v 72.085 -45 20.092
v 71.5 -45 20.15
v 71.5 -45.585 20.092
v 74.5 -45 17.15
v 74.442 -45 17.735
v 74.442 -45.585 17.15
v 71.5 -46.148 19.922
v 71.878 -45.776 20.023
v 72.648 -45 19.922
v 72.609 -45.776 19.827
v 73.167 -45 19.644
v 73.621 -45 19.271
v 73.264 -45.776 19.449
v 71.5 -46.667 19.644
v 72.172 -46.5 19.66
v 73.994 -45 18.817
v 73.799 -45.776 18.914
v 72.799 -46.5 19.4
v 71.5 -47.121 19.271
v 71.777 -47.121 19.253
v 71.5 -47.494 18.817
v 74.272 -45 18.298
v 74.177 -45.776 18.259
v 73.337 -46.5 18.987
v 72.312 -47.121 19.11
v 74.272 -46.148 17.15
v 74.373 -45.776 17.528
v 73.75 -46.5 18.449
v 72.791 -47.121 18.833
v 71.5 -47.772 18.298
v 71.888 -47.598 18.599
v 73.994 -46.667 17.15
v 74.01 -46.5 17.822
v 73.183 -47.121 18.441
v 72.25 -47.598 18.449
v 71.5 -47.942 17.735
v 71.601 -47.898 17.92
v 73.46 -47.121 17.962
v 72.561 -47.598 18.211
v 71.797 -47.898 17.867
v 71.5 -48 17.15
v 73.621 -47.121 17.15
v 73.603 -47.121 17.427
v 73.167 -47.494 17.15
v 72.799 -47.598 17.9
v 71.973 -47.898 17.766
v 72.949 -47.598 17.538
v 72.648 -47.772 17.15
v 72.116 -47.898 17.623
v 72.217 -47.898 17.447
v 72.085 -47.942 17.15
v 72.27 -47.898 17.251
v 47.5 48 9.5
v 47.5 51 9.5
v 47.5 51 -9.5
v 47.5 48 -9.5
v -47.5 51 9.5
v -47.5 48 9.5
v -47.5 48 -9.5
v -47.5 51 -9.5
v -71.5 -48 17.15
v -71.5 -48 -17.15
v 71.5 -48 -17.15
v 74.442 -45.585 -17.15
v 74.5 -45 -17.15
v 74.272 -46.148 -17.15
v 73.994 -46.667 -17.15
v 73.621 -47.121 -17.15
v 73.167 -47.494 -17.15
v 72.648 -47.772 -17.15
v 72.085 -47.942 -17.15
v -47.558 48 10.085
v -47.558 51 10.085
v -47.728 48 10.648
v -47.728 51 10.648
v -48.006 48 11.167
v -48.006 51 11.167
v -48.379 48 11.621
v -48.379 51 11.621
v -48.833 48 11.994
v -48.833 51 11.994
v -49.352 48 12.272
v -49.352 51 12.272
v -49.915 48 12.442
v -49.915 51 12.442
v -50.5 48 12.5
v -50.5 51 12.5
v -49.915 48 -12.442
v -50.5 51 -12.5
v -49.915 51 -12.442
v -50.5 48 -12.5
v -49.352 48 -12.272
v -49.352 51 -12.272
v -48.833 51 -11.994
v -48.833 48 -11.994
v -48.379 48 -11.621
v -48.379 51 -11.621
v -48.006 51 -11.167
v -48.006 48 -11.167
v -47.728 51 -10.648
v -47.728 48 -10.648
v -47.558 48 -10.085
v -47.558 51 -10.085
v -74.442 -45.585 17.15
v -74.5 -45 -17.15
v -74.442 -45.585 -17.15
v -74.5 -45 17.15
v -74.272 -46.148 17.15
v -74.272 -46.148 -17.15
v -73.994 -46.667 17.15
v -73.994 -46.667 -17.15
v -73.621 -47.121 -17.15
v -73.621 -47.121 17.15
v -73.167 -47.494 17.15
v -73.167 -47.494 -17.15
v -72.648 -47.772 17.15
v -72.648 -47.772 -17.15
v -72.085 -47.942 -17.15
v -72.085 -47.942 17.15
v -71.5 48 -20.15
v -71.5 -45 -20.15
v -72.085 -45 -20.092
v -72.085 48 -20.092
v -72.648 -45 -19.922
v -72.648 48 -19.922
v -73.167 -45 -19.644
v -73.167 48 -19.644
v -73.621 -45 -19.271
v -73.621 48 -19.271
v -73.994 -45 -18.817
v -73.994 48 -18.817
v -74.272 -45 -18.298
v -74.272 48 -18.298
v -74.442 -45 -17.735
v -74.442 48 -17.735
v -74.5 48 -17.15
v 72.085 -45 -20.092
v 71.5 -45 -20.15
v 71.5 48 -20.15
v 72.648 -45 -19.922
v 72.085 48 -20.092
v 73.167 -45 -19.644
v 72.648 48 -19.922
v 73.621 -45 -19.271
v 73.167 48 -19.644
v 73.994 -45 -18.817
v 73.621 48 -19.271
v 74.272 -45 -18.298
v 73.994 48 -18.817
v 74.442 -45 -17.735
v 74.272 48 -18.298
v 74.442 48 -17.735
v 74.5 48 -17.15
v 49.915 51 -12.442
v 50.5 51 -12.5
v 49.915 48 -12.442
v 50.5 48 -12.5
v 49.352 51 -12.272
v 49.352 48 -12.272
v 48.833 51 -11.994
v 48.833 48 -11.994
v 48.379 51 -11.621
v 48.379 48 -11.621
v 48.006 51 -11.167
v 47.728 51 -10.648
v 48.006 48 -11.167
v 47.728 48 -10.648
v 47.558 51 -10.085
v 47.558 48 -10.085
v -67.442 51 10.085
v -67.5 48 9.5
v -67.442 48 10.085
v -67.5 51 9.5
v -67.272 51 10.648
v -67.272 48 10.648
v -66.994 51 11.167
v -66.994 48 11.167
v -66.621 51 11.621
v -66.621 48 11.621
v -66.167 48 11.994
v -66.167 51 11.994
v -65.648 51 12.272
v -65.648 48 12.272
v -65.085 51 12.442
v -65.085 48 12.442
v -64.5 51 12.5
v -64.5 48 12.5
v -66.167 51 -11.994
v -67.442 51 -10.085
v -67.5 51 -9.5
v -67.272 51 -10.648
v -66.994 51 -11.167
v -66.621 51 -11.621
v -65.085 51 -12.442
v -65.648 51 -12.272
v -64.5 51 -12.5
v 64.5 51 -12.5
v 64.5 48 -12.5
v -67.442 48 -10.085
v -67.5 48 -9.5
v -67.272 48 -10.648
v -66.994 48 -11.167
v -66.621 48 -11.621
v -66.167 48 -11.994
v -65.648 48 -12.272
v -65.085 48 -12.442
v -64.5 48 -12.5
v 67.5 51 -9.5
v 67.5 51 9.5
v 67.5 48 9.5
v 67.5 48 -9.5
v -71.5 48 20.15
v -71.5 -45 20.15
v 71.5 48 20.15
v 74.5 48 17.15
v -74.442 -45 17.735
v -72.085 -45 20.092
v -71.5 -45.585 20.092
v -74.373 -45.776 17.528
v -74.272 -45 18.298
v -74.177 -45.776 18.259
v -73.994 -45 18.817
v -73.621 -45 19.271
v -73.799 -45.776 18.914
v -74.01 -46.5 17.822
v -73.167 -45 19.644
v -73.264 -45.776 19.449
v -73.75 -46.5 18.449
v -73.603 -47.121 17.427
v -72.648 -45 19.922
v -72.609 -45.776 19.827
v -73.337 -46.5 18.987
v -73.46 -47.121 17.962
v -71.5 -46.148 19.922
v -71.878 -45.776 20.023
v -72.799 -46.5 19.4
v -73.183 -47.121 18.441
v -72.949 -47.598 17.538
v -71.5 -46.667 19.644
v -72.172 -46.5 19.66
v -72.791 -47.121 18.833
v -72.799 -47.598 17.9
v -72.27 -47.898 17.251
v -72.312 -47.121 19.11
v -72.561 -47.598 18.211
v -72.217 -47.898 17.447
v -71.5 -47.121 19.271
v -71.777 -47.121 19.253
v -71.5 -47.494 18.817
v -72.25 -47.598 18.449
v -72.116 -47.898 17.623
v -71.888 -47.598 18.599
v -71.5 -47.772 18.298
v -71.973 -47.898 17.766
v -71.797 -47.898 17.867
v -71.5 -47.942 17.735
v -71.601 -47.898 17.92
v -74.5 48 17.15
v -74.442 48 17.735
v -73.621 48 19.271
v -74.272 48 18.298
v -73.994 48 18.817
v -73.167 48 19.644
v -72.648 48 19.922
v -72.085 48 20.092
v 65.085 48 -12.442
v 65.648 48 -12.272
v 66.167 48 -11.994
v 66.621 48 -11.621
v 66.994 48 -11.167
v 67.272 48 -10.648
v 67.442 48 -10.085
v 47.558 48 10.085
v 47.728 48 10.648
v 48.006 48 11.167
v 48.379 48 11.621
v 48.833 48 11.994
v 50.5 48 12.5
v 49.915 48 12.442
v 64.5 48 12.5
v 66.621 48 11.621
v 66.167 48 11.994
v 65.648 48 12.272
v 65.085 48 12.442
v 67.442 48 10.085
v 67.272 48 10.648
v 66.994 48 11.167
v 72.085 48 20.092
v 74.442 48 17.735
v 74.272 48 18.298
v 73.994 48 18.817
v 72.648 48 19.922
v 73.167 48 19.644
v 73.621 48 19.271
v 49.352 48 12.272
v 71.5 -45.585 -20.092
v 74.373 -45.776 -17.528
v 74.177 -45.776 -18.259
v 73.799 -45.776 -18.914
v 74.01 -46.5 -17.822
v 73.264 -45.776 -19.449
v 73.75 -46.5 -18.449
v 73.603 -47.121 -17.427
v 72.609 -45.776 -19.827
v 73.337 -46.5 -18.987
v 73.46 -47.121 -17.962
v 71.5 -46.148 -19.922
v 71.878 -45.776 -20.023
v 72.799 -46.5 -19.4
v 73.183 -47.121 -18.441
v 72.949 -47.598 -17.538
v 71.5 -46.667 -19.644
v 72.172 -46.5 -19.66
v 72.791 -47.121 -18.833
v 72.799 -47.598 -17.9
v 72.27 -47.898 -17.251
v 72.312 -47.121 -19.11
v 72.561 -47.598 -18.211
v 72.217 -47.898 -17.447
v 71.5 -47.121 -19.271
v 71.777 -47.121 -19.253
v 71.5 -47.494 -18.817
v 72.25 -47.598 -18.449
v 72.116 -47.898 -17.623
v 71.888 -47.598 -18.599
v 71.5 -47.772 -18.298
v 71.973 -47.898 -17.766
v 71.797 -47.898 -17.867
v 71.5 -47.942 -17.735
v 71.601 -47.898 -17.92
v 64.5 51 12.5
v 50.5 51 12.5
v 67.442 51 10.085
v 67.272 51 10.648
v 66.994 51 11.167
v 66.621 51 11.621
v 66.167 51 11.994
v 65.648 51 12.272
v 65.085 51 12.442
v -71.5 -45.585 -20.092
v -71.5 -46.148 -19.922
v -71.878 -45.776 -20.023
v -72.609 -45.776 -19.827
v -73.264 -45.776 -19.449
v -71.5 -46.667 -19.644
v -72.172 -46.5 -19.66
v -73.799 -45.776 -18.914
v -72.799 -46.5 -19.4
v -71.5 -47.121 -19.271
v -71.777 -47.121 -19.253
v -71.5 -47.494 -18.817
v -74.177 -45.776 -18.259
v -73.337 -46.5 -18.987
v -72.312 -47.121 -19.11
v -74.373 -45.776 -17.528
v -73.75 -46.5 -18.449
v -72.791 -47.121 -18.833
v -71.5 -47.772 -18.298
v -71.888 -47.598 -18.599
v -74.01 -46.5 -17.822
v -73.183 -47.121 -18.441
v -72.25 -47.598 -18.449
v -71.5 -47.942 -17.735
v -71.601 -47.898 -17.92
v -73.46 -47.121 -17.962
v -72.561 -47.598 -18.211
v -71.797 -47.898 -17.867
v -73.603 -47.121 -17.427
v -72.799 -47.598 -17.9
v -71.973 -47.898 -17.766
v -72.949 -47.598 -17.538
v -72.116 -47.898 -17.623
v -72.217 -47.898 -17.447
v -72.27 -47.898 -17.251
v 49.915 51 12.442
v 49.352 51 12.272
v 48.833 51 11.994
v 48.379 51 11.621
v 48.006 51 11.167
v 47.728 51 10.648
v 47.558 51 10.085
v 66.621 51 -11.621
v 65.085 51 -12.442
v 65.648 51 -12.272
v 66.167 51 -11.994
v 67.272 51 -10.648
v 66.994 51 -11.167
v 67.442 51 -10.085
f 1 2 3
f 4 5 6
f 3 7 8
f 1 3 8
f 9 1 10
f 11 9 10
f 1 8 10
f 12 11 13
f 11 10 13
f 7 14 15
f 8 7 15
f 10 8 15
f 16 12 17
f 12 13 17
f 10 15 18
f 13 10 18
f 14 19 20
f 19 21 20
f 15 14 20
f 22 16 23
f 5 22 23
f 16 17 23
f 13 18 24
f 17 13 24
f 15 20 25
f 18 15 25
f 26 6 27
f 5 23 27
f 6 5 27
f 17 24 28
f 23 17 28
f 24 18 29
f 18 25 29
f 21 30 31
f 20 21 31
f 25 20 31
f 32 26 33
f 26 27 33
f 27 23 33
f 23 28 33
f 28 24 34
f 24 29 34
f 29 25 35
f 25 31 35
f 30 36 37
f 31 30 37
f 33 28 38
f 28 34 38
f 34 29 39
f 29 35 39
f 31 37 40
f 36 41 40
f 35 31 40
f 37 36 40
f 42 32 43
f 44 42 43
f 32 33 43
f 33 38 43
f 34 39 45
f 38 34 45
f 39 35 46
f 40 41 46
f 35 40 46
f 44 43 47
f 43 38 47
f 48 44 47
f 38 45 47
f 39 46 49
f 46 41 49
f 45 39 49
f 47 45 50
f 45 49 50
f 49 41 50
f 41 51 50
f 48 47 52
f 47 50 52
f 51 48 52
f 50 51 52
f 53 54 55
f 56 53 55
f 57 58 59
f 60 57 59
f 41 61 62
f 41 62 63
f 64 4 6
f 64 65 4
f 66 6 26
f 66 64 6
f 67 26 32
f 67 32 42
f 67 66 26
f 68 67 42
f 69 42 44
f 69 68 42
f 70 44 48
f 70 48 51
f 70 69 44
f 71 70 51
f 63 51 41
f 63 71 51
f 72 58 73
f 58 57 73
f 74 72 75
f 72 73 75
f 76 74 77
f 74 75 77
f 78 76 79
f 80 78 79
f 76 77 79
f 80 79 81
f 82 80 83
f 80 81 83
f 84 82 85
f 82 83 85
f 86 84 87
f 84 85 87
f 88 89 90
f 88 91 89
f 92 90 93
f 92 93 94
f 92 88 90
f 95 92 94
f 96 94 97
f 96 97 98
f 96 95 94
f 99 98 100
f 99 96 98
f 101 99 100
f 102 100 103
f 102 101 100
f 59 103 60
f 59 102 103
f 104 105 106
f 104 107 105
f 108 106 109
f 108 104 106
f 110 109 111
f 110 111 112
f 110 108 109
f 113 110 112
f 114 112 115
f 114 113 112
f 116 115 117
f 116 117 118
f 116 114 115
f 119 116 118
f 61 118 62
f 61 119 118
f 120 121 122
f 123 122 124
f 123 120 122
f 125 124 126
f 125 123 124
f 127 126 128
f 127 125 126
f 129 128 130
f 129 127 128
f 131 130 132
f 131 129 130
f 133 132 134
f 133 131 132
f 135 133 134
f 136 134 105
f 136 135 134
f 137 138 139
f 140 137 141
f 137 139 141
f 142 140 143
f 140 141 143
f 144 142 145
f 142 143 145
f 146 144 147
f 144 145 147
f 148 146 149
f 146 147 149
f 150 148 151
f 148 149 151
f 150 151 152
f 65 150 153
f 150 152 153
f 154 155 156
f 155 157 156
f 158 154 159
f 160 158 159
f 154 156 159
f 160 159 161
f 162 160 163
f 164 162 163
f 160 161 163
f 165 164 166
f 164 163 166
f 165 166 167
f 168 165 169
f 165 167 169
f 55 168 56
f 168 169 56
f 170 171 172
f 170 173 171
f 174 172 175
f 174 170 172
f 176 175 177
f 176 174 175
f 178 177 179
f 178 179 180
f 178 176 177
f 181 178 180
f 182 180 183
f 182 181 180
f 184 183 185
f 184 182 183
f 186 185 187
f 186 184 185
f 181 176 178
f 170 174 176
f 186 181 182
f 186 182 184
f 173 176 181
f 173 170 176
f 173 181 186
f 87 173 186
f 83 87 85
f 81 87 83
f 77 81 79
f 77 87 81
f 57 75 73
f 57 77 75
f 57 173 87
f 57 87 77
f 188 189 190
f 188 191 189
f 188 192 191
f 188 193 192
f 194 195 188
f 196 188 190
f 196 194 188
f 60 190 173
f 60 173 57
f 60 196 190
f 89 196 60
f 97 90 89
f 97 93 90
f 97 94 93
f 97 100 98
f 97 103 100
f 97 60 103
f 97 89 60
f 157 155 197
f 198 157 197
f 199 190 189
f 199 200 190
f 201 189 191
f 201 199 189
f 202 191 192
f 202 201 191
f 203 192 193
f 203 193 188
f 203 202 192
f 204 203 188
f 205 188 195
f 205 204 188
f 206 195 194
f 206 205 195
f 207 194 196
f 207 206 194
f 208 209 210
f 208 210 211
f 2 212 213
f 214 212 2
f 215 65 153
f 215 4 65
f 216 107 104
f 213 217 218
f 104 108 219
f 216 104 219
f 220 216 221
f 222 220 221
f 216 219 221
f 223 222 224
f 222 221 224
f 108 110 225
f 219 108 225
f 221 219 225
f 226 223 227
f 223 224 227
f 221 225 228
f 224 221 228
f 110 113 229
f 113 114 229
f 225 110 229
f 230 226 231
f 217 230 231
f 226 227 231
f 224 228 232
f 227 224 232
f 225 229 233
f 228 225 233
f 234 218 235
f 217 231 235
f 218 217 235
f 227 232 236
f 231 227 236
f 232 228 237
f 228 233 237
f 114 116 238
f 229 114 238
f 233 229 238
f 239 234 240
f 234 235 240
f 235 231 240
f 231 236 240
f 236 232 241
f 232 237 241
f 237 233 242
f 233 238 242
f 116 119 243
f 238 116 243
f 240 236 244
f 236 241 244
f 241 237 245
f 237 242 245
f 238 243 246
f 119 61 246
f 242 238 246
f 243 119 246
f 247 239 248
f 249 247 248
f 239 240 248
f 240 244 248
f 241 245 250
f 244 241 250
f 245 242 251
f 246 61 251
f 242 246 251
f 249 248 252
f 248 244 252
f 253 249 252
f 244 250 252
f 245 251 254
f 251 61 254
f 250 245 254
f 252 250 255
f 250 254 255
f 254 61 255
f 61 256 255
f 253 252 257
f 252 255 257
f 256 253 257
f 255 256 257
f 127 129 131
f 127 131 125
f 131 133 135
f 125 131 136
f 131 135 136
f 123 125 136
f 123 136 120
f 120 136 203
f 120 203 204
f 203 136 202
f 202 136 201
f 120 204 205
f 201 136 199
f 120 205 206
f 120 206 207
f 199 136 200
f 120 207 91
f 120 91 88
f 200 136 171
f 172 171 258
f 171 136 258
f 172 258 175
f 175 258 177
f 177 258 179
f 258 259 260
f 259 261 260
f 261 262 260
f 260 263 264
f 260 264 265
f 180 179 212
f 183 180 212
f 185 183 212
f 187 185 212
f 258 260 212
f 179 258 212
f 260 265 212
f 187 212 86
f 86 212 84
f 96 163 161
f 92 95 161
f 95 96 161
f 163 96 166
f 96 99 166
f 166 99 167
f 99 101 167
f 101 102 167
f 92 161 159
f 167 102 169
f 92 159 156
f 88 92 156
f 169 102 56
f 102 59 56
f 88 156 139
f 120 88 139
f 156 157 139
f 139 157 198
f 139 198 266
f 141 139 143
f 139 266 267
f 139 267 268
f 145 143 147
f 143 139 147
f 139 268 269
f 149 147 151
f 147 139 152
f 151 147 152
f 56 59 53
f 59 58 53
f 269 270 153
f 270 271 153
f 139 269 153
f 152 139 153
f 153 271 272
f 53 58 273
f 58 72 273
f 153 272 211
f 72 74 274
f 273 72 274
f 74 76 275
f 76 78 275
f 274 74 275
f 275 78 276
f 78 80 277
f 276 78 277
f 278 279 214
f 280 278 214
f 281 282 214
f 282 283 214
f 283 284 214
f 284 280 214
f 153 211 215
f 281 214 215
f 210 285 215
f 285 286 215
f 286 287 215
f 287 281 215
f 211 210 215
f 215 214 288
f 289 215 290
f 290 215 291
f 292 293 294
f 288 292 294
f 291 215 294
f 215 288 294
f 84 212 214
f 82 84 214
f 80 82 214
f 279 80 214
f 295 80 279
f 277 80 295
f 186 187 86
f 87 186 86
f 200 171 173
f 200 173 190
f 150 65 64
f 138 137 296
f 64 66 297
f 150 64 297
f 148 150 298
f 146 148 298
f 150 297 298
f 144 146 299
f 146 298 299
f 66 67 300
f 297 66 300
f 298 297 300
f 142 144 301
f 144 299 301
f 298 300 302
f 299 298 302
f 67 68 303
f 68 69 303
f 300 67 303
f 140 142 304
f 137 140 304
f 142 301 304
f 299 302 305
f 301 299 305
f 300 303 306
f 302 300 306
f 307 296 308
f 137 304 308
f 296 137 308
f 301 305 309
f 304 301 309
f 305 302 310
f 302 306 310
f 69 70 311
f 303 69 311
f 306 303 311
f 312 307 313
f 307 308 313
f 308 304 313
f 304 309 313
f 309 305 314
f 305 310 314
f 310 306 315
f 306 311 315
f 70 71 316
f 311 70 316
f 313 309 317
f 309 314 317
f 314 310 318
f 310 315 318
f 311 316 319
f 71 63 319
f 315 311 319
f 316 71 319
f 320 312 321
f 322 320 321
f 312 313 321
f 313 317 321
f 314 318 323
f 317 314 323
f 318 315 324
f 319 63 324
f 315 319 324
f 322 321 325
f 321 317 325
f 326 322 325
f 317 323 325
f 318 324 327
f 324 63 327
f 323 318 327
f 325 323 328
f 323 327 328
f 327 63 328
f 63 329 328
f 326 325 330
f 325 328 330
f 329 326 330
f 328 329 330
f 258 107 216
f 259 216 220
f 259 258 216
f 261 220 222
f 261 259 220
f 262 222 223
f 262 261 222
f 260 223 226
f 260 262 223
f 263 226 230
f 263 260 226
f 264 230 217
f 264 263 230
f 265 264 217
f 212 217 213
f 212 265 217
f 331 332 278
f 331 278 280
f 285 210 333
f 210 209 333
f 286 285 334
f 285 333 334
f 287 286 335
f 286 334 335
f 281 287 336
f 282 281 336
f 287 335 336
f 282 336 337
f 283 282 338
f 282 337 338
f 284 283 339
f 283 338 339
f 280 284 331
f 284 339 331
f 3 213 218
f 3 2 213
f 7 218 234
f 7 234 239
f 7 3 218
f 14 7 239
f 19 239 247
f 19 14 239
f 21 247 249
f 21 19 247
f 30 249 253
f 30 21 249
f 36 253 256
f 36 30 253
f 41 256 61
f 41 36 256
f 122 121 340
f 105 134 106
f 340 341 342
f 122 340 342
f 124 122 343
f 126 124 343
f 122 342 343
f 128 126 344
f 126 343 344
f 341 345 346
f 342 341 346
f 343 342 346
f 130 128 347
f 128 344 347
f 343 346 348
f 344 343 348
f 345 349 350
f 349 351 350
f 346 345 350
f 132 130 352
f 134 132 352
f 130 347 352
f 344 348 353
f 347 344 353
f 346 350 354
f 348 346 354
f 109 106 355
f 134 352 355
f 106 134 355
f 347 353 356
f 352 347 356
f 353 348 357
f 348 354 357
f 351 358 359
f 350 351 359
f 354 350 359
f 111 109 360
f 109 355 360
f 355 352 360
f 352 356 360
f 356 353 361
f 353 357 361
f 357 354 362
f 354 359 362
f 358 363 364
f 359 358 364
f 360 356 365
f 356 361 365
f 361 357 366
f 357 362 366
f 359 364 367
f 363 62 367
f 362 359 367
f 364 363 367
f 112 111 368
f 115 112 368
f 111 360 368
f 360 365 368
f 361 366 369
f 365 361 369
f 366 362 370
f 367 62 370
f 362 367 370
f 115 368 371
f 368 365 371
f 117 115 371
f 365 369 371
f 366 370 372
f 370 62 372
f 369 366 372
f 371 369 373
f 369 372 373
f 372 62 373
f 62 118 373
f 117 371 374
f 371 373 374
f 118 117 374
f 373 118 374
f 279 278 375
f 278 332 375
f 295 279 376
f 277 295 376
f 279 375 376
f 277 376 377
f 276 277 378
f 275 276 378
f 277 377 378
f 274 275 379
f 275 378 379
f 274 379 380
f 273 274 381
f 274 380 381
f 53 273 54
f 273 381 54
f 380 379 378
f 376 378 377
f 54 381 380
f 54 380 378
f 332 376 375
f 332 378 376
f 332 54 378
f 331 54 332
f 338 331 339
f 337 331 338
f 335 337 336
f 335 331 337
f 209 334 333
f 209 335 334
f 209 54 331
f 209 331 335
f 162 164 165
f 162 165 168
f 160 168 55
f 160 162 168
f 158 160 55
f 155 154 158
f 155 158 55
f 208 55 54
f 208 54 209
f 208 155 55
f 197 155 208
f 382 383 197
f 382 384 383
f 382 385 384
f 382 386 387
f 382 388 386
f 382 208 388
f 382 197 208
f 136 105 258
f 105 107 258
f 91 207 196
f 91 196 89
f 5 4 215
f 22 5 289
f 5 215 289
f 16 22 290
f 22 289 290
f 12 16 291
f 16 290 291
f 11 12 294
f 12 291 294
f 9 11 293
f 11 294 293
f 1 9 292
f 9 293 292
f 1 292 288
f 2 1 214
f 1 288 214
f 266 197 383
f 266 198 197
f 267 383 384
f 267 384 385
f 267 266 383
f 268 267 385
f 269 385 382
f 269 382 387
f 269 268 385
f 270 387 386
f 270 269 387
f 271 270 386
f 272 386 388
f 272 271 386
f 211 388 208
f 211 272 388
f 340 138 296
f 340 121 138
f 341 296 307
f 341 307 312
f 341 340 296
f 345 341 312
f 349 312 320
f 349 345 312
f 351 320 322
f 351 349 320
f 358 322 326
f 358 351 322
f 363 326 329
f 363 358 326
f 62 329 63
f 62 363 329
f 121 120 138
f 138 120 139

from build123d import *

# Parameters (mm, degrees)
SKETCH1_W           = 149
SKETCH1_H           = 96
BOSS_EXTRUDE1_DEPTH = 20.15
SKETCH2_W           = 20
SKETCH2_H           = 25
BOSS_EXTRUDE2_DEPTH = 3
FILLET1_R           = 3
FILLET2_R           = 3
FILLET3_R           = 3


with BuildPart() as part:
    # Sketch1 → Boss-Extrude1 (new body, symmetric)
    with BuildSketch(Plane.XY):
        Rectangle(SKETCH1_W, SKETCH1_H)
    extrude(amount=BOSS_EXTRUDE1_DEPTH, both=True)

    # Sketch2 → Boss-Extrude2 (add, symmetric)
    with BuildSketch(Plane(origin=(0, 48, 0), x_dir=(1, 0, 0), z_dir=(0, 1, 0))):
        with Locations((-57.5, 0)):
            Rectangle(SKETCH2_W, SKETCH2_H)
        with Locations((57.5, 0)):
            Rectangle(SKETCH2_W, SKETCH2_H)
    extrude(amount=BOSS_EXTRUDE2_DEPTH, both=True)

    # Fillet1
    fillet1_edges = [part.edges().sort_by_distance(p)[0] for p in [
        (74.5, 0, 20.15),
        (-74.5, 0, 20.15),
        (74.5, 0, -20.15),
        (-74.5, 0, -20.15),
    ]]
    fillet(fillet1_edges, radius=FILLET1_R)

    # Fillet2
    fillet2_edges = [part.edges().sort_by_distance(p)[0] for p in [
        (0, -48, 20.15),
        (0, -48, -20.15),
        (74.5, -48, 0),
        (-74.5, -48, 0),
        (73.621320344, -48, 19.271320344),
        (73.621320344, -48, -19.271320344),
        (-73.621320344, -48, -19.271320344),
        (-73.621320344, -48, 19.271320344),
    ]]
    fillet(fillet2_edges, radius=FILLET2_R)

    # Fillet3
    fillet3_edges = [part.edges().sort_by_distance(p)[0] for p in [
        (-67.5, 49.5, -12.5),
        (-67.5, 49.5, 12.5),
        (-47.5, 49.5, 12.5),
        (-47.5, 49.5, -12.5),
        (67.5, 49.5, 12.5),
        (67.5, 49.5, -12.5),
        (47.5, 49.5, -12.5),
        (47.5, 49.5, 12.5),
    ]]
    fillet(fillet3_edges, radius=FILLET3_R)


solid = part.part
